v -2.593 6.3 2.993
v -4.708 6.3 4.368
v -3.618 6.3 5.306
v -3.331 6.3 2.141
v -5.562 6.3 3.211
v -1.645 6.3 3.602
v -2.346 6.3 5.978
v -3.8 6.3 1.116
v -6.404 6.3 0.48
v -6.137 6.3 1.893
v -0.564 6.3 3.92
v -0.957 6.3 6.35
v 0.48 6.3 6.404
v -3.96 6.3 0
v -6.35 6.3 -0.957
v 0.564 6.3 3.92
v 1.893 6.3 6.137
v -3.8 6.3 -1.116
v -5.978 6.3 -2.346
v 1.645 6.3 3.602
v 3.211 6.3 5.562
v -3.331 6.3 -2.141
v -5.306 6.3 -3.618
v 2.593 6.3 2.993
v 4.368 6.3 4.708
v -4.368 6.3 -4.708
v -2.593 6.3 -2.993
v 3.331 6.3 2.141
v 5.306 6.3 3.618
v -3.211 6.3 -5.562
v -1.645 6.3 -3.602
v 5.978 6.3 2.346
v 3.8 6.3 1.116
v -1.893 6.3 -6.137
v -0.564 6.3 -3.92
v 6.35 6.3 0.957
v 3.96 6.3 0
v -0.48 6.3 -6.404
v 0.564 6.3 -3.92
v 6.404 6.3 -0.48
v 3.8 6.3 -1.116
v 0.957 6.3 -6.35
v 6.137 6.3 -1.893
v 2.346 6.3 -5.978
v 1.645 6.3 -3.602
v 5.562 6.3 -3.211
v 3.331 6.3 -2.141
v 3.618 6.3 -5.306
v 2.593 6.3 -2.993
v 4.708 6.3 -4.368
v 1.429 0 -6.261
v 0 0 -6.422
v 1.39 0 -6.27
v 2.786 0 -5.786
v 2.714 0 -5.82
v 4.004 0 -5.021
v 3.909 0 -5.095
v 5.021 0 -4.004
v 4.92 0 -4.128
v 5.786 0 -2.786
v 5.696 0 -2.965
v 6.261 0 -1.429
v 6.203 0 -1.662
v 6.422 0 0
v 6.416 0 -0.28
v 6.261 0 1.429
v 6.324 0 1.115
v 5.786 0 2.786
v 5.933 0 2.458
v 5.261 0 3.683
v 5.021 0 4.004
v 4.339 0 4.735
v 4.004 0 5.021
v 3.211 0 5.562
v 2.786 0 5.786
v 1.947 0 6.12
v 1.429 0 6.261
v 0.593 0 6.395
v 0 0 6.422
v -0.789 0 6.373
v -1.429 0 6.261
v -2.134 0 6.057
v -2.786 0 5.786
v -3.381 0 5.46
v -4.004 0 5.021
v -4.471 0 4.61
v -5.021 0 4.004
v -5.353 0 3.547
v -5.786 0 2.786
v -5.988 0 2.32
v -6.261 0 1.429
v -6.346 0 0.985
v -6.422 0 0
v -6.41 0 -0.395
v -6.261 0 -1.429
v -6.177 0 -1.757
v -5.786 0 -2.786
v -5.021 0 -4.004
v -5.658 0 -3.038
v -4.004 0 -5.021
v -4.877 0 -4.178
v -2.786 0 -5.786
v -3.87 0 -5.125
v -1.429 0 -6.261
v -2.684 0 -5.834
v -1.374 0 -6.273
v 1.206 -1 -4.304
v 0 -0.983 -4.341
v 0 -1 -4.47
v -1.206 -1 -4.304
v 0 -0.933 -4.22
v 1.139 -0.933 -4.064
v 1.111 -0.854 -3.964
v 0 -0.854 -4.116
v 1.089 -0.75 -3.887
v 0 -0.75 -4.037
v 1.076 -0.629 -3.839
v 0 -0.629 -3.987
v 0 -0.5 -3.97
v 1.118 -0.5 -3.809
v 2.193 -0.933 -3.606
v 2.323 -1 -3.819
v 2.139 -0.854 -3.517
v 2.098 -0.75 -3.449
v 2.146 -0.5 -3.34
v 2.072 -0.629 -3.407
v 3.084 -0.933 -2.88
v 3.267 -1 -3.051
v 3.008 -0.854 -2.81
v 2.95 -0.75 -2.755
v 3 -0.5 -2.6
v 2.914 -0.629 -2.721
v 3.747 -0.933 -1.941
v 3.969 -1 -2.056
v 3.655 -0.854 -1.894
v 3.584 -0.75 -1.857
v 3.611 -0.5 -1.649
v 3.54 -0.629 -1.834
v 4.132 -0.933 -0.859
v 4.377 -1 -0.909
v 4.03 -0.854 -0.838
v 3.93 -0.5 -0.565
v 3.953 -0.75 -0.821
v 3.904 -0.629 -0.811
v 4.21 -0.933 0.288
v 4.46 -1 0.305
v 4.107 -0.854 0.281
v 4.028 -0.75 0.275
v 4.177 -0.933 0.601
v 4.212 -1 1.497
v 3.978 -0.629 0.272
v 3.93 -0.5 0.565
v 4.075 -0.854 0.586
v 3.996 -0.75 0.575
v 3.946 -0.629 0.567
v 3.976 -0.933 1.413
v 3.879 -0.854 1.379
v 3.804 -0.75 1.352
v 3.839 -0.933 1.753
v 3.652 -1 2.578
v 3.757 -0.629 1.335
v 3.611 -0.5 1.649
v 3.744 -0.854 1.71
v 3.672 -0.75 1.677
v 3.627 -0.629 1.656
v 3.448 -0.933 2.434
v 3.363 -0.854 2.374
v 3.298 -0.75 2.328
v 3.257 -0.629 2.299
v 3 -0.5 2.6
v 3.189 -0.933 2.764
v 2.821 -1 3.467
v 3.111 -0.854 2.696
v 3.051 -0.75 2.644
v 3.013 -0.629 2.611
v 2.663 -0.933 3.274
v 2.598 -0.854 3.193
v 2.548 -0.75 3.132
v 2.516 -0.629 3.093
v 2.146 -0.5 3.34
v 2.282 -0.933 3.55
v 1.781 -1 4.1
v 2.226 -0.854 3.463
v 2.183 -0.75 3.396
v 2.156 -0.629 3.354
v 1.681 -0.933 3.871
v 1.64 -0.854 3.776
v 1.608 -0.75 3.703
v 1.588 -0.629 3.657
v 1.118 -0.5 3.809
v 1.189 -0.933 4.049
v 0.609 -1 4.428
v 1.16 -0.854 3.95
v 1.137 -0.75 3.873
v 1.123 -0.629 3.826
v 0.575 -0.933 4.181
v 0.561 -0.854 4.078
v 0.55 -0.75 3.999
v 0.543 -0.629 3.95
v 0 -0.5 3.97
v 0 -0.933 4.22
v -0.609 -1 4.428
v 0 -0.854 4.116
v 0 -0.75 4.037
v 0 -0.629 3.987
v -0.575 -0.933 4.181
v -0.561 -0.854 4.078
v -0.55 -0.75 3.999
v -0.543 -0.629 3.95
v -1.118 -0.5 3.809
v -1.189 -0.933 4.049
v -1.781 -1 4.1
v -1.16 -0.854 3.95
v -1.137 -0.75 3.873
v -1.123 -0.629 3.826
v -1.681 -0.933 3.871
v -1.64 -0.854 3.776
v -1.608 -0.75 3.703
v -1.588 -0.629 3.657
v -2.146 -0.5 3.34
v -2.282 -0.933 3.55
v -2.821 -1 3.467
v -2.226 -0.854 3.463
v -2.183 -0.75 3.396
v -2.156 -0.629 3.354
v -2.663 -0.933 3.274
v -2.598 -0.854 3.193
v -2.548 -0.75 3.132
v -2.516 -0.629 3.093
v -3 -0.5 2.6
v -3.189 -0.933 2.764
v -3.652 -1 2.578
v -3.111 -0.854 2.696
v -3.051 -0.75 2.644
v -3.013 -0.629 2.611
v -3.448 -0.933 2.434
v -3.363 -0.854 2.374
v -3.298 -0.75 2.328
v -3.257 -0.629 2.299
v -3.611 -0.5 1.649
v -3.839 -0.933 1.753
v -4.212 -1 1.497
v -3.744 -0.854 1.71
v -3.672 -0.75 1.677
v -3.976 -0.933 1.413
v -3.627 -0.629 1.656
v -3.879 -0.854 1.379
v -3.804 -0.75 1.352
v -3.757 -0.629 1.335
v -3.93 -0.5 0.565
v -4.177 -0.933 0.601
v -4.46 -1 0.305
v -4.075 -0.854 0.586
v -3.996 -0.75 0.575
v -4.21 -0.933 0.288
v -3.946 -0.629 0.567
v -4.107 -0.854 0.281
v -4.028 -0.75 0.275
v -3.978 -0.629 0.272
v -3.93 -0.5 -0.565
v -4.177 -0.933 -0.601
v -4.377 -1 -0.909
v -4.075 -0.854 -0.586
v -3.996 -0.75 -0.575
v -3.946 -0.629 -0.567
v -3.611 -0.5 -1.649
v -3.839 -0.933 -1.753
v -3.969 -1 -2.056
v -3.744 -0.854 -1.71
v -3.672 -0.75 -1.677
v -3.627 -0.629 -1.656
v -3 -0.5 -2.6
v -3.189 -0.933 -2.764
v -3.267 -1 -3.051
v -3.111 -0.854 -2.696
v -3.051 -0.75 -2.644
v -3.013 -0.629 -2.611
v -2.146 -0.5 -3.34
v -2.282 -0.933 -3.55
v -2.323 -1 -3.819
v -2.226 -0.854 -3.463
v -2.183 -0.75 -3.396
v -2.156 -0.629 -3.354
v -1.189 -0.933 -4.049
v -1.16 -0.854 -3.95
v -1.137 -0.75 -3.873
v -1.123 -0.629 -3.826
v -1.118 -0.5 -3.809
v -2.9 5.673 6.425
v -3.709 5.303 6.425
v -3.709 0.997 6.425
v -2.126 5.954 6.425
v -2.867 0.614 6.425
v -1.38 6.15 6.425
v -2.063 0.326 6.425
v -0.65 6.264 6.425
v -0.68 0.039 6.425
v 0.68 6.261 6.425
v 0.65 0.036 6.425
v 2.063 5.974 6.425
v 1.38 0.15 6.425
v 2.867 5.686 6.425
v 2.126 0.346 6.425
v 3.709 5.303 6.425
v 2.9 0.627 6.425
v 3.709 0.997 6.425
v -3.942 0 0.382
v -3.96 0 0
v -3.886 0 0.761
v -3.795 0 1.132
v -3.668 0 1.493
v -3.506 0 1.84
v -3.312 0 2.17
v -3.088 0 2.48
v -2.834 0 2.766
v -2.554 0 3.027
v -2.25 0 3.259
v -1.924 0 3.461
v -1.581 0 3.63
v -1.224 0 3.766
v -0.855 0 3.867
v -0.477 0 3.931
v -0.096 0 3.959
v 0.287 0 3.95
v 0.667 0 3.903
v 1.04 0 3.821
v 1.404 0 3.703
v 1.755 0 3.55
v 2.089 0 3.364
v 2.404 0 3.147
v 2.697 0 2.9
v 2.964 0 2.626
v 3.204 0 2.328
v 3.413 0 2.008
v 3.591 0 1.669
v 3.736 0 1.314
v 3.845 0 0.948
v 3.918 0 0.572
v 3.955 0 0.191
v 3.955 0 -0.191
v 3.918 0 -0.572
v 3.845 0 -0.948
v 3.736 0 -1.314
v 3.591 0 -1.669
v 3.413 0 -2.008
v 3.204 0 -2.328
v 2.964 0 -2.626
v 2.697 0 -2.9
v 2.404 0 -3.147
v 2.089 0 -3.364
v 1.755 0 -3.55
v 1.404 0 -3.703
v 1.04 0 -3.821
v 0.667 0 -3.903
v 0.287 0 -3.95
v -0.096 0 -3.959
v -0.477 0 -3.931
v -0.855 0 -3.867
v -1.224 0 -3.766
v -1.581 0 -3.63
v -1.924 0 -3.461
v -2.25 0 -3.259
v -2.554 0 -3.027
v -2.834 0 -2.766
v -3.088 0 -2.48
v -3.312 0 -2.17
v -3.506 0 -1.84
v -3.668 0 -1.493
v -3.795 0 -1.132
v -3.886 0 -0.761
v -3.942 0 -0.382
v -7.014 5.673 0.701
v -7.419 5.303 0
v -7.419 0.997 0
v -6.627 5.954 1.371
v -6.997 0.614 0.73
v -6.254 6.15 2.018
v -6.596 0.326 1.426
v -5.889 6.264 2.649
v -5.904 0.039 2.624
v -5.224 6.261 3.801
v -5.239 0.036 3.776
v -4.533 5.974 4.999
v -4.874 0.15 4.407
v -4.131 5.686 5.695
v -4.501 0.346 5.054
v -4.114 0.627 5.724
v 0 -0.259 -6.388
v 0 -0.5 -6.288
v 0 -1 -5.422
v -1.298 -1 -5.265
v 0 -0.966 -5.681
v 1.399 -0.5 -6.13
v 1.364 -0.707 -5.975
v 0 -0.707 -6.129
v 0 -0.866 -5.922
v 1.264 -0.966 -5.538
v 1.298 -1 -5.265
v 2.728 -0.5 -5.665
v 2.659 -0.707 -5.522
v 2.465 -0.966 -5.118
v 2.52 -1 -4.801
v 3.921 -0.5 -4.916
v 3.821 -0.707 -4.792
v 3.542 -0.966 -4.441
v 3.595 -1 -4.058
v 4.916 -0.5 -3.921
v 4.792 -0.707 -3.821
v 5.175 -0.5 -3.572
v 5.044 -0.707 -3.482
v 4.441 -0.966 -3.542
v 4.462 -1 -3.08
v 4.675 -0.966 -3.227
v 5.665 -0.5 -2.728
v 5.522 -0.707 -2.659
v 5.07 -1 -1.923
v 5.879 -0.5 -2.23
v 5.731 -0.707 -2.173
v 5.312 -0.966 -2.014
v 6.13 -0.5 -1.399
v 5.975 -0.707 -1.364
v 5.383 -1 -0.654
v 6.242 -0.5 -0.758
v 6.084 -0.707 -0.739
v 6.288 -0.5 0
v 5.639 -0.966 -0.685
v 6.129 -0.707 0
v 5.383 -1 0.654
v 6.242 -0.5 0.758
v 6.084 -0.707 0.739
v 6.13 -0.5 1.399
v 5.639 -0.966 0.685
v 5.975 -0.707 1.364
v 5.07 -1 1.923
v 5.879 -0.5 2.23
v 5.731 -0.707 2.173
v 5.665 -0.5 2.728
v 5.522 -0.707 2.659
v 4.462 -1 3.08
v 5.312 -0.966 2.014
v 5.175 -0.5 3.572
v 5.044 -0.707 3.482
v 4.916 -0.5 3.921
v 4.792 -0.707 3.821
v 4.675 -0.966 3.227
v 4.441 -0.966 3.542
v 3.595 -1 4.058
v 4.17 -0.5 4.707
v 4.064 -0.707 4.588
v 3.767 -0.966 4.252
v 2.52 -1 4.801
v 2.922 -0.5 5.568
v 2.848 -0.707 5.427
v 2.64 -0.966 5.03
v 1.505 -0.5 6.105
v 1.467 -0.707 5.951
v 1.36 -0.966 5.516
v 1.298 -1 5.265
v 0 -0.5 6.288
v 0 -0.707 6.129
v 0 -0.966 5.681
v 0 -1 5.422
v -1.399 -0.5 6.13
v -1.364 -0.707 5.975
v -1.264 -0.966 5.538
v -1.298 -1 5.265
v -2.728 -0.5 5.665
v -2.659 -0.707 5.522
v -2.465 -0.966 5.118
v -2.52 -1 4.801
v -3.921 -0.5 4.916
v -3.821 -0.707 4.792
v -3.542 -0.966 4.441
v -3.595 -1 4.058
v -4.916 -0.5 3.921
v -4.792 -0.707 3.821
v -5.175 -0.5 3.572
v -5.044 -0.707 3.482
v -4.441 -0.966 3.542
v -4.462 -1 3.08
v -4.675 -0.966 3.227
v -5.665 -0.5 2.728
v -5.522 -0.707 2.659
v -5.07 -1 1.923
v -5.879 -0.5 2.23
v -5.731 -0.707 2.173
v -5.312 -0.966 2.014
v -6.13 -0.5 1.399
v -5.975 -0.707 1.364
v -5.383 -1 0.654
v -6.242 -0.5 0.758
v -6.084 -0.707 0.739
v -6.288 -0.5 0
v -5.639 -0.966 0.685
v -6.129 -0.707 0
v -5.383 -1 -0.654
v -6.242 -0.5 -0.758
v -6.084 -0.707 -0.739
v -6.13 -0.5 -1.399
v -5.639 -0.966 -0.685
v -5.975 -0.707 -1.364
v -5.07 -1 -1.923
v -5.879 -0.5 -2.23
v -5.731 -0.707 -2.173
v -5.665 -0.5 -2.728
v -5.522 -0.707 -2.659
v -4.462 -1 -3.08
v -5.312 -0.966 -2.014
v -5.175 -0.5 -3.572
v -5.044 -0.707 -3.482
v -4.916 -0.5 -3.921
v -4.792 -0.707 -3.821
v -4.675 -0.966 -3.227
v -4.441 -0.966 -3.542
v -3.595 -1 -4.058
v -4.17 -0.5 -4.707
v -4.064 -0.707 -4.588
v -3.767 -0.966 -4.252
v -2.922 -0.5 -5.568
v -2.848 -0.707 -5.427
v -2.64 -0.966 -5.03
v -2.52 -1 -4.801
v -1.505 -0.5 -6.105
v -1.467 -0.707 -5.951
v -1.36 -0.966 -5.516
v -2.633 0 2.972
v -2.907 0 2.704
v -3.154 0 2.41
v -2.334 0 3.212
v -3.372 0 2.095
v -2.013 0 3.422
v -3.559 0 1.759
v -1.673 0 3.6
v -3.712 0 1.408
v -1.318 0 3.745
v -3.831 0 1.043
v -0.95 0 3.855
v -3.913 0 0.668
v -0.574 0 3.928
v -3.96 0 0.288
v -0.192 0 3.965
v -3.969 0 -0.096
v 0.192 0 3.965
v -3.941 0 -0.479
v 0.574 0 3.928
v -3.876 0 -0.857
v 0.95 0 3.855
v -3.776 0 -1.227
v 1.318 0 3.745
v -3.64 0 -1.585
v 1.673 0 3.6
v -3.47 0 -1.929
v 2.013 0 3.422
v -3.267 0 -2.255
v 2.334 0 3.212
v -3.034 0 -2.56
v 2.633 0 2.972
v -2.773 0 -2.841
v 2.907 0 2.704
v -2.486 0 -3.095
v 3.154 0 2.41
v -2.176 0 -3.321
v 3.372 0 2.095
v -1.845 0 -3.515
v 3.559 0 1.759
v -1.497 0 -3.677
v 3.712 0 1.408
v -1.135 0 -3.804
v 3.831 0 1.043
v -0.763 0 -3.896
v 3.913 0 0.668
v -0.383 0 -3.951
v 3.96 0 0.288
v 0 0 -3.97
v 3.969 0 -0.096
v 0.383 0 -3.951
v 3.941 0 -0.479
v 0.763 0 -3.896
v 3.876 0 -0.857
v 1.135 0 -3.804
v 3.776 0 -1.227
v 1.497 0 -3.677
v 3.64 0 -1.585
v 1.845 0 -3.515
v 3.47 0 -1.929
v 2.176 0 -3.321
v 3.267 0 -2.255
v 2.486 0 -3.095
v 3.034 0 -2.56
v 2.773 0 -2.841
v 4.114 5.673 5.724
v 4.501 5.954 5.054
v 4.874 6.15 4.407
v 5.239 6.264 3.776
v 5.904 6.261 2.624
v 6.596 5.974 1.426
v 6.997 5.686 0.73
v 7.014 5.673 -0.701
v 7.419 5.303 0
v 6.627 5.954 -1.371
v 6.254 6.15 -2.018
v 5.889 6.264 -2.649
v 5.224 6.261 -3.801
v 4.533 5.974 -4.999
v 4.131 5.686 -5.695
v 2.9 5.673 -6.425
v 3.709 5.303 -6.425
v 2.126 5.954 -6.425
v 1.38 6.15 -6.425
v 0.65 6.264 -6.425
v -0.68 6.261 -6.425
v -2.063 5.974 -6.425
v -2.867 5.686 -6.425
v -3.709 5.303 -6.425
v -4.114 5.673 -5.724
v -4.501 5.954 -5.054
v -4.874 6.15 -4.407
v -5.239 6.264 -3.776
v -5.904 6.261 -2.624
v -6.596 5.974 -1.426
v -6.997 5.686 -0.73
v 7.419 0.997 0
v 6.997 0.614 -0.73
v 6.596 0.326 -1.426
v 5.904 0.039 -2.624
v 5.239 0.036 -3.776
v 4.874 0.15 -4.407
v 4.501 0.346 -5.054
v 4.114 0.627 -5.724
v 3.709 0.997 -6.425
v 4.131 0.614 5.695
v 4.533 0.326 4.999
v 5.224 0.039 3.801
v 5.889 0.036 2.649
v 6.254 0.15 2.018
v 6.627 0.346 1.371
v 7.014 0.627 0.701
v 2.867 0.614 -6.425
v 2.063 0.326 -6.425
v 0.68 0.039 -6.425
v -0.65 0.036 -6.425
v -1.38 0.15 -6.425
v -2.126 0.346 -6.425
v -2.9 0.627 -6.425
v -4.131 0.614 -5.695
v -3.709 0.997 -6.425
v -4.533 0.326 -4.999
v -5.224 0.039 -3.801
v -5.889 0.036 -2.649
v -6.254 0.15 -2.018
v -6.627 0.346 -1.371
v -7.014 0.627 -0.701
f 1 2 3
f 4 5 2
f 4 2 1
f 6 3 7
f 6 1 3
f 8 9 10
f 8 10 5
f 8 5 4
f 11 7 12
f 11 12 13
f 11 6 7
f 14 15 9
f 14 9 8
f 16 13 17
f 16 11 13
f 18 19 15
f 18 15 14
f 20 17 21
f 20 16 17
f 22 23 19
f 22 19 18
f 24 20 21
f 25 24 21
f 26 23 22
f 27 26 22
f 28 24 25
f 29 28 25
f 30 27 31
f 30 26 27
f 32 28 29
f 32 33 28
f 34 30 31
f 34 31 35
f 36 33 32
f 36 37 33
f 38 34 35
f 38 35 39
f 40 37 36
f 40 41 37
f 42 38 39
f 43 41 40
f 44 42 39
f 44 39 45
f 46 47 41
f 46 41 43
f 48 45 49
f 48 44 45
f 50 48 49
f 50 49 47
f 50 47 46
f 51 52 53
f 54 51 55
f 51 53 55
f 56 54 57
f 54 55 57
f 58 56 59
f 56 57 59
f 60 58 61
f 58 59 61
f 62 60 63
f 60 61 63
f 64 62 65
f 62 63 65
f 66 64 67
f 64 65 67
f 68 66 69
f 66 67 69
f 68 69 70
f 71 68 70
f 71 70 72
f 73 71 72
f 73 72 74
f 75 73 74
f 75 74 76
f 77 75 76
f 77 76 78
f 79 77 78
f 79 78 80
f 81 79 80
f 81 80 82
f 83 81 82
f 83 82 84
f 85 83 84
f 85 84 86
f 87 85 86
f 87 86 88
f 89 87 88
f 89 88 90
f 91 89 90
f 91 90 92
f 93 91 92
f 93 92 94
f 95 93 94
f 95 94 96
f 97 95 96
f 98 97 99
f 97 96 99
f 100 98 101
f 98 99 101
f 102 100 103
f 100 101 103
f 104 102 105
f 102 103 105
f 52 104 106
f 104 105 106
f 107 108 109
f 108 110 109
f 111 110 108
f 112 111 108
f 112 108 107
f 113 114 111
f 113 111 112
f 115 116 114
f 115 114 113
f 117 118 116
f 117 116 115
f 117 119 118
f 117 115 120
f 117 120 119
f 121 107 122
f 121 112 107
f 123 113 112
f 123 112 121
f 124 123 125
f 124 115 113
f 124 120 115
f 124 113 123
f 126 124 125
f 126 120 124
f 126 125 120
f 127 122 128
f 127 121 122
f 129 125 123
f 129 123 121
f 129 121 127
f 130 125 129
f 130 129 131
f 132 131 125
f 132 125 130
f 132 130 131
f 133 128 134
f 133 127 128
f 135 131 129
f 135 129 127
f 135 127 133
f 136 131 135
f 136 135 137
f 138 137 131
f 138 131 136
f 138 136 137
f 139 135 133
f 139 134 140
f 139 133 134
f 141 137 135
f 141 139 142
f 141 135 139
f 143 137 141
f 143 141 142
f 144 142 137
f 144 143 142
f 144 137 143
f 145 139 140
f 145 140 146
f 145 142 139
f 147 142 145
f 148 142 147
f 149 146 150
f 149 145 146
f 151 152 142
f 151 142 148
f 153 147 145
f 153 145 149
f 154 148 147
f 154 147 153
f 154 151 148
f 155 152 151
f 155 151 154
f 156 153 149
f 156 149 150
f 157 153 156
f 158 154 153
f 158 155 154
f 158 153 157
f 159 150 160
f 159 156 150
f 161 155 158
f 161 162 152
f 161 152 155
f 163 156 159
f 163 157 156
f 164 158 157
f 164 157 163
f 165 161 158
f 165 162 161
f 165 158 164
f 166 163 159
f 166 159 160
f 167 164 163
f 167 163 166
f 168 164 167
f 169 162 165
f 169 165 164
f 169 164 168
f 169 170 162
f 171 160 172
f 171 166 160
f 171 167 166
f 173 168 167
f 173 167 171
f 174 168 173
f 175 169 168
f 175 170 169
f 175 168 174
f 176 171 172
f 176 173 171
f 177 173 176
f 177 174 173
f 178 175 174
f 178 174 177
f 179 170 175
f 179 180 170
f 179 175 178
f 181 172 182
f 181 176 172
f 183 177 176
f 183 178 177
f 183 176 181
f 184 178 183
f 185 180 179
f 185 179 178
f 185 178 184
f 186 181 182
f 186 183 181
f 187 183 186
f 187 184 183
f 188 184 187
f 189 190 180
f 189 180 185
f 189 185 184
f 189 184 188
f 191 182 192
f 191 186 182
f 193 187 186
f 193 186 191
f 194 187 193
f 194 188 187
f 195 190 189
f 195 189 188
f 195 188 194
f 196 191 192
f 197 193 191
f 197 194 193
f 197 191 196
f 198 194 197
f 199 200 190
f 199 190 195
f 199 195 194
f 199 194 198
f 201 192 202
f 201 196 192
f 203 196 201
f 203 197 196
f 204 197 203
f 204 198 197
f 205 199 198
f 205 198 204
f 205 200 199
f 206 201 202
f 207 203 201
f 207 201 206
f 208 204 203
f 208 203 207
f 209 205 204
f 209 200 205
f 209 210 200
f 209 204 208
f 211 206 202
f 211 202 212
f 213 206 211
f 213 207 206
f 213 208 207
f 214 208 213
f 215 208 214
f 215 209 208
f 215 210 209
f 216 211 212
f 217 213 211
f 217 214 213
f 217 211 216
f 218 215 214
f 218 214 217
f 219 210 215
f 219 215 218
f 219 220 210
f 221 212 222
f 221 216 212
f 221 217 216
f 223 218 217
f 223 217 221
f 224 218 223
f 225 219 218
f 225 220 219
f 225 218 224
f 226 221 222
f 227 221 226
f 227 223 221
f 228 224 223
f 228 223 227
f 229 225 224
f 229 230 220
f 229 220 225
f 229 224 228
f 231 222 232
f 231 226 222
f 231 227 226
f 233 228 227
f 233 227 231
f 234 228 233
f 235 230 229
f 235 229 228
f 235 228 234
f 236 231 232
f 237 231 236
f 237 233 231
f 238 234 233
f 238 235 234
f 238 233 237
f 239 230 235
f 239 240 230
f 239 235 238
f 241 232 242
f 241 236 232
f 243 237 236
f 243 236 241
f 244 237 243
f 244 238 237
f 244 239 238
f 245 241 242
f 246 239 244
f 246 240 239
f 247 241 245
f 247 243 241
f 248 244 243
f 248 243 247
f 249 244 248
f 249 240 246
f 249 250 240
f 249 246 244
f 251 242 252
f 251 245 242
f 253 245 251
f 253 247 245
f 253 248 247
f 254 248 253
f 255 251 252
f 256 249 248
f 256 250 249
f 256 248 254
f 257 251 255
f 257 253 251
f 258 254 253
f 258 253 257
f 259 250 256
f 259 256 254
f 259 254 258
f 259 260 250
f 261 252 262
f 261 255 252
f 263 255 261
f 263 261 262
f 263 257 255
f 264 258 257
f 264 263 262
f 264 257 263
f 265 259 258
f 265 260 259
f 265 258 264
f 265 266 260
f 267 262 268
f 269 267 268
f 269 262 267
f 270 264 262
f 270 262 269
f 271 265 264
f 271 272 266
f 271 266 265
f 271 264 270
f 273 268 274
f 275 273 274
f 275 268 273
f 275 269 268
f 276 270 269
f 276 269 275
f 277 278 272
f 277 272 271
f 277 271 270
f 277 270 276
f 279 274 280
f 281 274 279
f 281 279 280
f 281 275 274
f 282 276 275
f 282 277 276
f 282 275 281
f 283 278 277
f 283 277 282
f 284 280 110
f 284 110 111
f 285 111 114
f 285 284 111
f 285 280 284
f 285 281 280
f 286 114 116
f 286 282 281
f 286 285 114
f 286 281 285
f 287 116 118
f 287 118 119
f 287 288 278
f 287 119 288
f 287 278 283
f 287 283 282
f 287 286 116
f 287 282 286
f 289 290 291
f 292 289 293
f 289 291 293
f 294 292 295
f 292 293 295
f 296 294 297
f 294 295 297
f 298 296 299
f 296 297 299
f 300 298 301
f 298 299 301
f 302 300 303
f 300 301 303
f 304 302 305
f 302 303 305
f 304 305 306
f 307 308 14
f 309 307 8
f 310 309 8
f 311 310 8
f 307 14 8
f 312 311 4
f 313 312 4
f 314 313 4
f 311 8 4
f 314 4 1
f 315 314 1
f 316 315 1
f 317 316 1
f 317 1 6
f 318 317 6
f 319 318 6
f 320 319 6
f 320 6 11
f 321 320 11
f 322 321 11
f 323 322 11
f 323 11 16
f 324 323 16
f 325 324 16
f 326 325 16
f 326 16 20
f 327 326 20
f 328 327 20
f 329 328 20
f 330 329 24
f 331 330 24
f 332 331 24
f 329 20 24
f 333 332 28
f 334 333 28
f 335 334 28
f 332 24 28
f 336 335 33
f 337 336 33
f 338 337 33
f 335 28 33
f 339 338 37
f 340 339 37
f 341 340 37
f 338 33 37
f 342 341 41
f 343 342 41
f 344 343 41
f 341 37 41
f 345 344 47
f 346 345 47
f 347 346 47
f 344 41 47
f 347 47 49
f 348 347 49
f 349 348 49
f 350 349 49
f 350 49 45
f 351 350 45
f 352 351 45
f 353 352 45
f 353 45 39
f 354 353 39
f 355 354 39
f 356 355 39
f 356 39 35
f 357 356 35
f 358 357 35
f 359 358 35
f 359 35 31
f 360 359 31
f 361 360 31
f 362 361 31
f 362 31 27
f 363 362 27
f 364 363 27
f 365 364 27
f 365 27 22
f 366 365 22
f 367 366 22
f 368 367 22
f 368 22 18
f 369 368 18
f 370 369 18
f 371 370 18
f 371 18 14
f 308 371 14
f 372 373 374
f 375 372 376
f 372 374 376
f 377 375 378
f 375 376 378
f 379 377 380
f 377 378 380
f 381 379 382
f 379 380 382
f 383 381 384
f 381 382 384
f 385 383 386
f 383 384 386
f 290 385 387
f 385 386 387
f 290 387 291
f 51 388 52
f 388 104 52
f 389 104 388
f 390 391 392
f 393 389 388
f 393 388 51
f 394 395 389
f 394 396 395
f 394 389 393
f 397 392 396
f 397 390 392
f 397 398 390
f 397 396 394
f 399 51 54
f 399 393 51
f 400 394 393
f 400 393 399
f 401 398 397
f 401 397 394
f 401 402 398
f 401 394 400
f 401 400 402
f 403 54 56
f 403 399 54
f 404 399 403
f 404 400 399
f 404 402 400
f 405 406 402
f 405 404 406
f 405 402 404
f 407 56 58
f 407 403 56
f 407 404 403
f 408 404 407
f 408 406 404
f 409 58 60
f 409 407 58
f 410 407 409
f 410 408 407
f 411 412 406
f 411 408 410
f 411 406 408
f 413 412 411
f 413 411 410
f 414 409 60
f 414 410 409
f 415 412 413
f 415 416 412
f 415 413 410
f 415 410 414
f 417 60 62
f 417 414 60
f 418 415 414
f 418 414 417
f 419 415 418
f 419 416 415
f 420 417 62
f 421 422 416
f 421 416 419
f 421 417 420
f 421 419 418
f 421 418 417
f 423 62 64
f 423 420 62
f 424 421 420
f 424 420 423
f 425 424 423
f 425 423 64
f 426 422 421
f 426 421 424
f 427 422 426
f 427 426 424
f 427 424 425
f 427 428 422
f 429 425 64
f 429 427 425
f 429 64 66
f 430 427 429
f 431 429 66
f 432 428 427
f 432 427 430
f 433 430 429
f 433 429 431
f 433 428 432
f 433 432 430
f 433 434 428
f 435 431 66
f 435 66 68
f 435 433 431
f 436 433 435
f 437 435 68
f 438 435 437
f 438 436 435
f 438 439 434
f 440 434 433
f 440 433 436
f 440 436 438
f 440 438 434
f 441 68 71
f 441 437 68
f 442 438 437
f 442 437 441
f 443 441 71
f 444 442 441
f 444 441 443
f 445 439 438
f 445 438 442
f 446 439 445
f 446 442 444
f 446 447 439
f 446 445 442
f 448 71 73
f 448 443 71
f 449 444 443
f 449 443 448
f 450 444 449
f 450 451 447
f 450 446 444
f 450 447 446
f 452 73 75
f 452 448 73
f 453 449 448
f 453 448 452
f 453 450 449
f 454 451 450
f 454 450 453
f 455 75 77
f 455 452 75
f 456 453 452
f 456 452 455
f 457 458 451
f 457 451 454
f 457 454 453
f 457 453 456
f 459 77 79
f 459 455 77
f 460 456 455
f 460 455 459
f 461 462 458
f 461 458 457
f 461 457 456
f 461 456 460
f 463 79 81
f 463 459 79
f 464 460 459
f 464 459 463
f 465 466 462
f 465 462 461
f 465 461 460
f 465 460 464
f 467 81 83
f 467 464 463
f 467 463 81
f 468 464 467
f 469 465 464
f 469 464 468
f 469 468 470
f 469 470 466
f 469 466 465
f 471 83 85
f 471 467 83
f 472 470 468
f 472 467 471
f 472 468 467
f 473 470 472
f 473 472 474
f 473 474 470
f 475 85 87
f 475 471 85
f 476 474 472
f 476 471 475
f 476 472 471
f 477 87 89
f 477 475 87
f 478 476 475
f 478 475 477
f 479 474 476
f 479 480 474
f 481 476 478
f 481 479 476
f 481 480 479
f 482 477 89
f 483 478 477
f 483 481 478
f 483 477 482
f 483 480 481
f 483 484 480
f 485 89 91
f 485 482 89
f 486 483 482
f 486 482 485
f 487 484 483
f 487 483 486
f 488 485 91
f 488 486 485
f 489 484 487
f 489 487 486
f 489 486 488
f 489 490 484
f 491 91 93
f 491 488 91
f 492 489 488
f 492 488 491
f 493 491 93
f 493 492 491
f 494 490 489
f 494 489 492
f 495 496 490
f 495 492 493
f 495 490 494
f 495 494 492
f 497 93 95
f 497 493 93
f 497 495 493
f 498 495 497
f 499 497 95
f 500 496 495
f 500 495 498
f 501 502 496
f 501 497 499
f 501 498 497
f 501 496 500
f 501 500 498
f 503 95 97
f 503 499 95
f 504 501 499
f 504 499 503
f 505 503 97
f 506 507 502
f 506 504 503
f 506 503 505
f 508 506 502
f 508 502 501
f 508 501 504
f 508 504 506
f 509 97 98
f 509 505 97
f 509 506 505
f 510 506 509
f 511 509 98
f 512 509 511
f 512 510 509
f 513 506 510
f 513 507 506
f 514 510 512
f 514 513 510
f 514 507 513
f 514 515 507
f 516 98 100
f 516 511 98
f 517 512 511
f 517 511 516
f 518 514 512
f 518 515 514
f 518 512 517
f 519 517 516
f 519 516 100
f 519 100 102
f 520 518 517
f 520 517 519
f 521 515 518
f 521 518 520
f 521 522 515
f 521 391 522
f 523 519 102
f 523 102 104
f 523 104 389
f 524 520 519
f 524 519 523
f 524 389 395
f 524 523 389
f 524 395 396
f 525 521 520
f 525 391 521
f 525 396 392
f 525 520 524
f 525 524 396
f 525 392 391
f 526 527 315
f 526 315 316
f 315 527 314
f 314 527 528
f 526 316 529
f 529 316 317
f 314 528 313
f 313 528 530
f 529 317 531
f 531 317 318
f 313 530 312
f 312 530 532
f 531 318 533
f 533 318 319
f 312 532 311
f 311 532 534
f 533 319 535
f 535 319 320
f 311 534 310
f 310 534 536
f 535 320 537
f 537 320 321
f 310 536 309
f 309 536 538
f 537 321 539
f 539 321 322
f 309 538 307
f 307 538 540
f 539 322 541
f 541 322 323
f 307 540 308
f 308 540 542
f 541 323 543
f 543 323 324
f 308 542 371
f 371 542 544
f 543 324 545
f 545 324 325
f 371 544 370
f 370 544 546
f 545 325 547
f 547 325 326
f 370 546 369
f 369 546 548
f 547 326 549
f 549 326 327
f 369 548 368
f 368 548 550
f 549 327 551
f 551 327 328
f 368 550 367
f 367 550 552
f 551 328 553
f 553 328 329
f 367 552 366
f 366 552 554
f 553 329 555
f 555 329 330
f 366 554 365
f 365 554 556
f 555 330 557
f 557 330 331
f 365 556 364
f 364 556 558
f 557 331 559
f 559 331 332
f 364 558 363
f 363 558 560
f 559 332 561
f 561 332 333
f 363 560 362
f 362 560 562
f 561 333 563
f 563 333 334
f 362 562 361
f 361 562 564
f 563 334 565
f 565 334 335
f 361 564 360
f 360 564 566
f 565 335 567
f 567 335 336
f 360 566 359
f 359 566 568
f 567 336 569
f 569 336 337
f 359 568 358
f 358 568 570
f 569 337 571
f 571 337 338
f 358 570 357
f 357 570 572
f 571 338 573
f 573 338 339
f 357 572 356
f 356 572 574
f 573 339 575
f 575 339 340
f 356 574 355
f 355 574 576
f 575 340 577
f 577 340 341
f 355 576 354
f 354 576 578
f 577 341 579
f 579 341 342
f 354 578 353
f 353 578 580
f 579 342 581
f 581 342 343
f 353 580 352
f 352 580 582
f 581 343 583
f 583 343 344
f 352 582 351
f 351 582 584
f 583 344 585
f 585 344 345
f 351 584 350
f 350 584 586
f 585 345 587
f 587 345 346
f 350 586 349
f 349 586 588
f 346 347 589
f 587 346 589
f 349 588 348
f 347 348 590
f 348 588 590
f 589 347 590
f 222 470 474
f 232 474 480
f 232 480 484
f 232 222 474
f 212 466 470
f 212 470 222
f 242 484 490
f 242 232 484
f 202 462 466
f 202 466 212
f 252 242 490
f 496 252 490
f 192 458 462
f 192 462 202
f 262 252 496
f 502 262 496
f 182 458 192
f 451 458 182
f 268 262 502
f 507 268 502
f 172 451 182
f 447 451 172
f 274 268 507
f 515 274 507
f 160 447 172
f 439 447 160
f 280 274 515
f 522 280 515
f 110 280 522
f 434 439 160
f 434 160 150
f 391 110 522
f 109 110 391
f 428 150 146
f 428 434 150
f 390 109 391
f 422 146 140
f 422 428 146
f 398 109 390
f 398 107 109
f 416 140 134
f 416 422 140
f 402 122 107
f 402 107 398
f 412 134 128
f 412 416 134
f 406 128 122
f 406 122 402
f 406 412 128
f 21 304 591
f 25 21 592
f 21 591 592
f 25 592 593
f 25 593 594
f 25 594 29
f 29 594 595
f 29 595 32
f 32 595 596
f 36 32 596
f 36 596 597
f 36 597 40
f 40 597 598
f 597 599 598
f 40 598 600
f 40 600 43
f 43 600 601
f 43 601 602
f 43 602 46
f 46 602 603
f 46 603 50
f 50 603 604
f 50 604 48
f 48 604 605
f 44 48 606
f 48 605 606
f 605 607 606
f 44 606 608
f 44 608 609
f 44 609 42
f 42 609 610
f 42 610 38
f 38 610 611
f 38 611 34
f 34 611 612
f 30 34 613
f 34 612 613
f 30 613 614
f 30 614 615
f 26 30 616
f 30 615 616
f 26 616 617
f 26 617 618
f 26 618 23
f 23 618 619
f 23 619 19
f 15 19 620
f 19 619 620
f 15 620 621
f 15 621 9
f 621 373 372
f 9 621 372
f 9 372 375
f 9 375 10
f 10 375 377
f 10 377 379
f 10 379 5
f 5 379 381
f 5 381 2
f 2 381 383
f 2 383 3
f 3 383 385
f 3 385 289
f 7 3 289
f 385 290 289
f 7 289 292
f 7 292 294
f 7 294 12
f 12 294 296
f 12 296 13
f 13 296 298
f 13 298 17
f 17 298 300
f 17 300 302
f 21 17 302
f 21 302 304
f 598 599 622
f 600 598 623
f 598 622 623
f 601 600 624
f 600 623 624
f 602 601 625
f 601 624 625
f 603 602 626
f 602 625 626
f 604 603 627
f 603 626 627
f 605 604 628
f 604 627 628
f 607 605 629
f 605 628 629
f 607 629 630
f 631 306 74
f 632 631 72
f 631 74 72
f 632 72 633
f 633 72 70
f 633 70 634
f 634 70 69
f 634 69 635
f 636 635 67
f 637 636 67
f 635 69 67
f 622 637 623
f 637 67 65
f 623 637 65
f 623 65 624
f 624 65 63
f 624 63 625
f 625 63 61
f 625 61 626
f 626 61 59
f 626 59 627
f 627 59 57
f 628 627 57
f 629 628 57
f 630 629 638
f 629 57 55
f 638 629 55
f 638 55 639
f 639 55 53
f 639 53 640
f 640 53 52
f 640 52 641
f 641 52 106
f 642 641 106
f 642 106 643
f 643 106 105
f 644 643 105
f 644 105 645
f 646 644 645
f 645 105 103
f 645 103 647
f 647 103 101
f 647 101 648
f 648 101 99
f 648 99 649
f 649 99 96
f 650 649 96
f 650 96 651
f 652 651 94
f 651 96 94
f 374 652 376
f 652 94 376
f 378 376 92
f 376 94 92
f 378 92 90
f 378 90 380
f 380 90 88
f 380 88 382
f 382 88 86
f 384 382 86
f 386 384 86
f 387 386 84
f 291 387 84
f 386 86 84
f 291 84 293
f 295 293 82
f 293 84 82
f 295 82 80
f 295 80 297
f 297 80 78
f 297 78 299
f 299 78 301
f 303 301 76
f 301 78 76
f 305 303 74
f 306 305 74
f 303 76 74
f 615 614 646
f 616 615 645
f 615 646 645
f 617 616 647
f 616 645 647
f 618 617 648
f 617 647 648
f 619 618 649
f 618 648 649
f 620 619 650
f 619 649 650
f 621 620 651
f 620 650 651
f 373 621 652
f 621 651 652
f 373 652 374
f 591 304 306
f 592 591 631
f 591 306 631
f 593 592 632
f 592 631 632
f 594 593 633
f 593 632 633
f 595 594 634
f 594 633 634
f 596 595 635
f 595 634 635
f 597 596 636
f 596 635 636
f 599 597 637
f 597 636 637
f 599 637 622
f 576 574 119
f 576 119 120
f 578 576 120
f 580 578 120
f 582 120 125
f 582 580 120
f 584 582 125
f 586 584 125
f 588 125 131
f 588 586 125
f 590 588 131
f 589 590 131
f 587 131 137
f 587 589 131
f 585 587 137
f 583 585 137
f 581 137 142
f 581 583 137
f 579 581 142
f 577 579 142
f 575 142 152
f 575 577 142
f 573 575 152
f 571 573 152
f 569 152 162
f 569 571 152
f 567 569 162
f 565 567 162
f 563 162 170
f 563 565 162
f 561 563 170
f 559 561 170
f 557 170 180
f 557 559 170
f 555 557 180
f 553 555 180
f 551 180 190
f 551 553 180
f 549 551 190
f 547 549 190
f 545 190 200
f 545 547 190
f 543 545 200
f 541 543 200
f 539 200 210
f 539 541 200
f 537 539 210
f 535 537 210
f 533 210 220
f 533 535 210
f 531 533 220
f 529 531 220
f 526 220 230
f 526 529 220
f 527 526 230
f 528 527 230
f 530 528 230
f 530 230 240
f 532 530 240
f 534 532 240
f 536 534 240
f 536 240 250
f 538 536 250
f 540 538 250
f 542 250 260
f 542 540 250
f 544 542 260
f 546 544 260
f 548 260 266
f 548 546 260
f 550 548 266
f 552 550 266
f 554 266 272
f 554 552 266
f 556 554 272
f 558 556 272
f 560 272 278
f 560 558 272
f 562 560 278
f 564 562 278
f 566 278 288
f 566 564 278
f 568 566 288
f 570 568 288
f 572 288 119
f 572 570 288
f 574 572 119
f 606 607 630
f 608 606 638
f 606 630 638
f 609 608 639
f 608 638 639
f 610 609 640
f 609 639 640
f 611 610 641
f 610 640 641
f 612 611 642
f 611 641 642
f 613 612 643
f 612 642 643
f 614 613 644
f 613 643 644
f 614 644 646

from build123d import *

# Parameters (mm, degrees)
SKETCH1_R                    = 3.5
BOSS_EXTRUDE1_DEPTH          = 6.3
F_5_16_24_TAPPED_HOLE4_D     = 7.919999908
F_5_16_24_TAPPED_HOLE4_DEPTH = 12
F_5_16_24_TAPPED_HOLE4_TIP   = 2.379408024
SKETCH27_R                   = 6.421961615
SKETCH27_R_2                 = 3.97
BOSS_EXTRUDE2_DEPTH          = 1
FILLET2_R                    = 1
FILLET3_R                    = 0.5


with BuildPart() as part:
    # Sketch1 → Boss-Extrude1 (new body)
    with BuildSketch(Plane(origin=(0, 0, 0), x_dir=(1, 0, 0), z_dir=(0, 1, 0))):
        Polygon((3.70947548, -6.425), (7.418950959, 0), (3.70947548, 6.425), (-3.70947548, 6.425), (-7.418950959, 0), (-3.70947548, -6.425), align=None)
        with Locations(Location((0, 0, 0), (0, 0, 270))):
            Circle(SKETCH1_R, mode=Mode.SUBTRACT)
    extrude(amount=BOSS_EXTRUDE1_DEPTH)

    # Sketch3 → Cut-Revolve4 (revolve, cut)
    with BuildSketch(Plane.XY, mode=Mode.PRIVATE) as cut_revolve4_sk:
        Polygon((-6.421961615, 6.8), (-6.421961615, 6.3), (-7.421961615, 5.3), (-7.921961615, 5.3), (-7.921961615, 6.8), align=None)
        Polygon((-7.421961615, 1), (-6.421961615, 0), (-6.421961615, -0.5), (-7.921961615, -0.5), (-7.921961615, 1), align=None)
    revolve(cut_revolve4_sk.sketch.rotate(Axis((0, 0, 0), (0, 1, 0)), 120.000000074), axis=Axis((0, 0, 0), (0, 1, 0)), mode=Mode.SUBTRACT)

    # 5/16-24 Tapped Hole4
    with Locations(Plane.XZ):
        with Locations((0, 0)):
            Hole(F_5_16_24_TAPPED_HOLE4_D / 2, depth=F_5_16_24_TAPPED_HOLE4_DEPTH)
            with Locations((0, 0, -(F_5_16_24_TAPPED_HOLE4_DEPTH + F_5_16_24_TAPPED_HOLE4_TIP / 2))):  # 118° drill point
                Cone(0, F_5_16_24_TAPPED_HOLE4_D / 2, F_5_16_24_TAPPED_HOLE4_TIP, mode=Mode.SUBTRACT)

    # Sketch27 → Boss-Extrude2 (add)
    with BuildSketch(Plane.XZ):
        with Locations(Location((0, 0, 0), (0, 0, 270))):
            Circle(SKETCH27_R)
        with Locations(Location((0, 0, 0), (0, 0, 270))):
            Circle(SKETCH27_R_2, mode=Mode.SUBTRACT)
    extrude(amount=BOSS_EXTRUDE2_DEPTH)

    # Fillet2
    fillet2_edges = [part.edges().sort_by_distance(p)[0] for p in [
        (0, -1, 6.421961615),
    ]]
    fillet(fillet2_edges, radius=FILLET2_R - 0.0001)  # a hair under: the kernel refuses the full size

    # Fillet3
    fillet3_edges = [part.edges().sort_by_distance(p)[0] for p in [
        (0, -1, 3.97),
    ]]
    fillet(fillet3_edges, radius=FILLET3_R)


solid = part.part
